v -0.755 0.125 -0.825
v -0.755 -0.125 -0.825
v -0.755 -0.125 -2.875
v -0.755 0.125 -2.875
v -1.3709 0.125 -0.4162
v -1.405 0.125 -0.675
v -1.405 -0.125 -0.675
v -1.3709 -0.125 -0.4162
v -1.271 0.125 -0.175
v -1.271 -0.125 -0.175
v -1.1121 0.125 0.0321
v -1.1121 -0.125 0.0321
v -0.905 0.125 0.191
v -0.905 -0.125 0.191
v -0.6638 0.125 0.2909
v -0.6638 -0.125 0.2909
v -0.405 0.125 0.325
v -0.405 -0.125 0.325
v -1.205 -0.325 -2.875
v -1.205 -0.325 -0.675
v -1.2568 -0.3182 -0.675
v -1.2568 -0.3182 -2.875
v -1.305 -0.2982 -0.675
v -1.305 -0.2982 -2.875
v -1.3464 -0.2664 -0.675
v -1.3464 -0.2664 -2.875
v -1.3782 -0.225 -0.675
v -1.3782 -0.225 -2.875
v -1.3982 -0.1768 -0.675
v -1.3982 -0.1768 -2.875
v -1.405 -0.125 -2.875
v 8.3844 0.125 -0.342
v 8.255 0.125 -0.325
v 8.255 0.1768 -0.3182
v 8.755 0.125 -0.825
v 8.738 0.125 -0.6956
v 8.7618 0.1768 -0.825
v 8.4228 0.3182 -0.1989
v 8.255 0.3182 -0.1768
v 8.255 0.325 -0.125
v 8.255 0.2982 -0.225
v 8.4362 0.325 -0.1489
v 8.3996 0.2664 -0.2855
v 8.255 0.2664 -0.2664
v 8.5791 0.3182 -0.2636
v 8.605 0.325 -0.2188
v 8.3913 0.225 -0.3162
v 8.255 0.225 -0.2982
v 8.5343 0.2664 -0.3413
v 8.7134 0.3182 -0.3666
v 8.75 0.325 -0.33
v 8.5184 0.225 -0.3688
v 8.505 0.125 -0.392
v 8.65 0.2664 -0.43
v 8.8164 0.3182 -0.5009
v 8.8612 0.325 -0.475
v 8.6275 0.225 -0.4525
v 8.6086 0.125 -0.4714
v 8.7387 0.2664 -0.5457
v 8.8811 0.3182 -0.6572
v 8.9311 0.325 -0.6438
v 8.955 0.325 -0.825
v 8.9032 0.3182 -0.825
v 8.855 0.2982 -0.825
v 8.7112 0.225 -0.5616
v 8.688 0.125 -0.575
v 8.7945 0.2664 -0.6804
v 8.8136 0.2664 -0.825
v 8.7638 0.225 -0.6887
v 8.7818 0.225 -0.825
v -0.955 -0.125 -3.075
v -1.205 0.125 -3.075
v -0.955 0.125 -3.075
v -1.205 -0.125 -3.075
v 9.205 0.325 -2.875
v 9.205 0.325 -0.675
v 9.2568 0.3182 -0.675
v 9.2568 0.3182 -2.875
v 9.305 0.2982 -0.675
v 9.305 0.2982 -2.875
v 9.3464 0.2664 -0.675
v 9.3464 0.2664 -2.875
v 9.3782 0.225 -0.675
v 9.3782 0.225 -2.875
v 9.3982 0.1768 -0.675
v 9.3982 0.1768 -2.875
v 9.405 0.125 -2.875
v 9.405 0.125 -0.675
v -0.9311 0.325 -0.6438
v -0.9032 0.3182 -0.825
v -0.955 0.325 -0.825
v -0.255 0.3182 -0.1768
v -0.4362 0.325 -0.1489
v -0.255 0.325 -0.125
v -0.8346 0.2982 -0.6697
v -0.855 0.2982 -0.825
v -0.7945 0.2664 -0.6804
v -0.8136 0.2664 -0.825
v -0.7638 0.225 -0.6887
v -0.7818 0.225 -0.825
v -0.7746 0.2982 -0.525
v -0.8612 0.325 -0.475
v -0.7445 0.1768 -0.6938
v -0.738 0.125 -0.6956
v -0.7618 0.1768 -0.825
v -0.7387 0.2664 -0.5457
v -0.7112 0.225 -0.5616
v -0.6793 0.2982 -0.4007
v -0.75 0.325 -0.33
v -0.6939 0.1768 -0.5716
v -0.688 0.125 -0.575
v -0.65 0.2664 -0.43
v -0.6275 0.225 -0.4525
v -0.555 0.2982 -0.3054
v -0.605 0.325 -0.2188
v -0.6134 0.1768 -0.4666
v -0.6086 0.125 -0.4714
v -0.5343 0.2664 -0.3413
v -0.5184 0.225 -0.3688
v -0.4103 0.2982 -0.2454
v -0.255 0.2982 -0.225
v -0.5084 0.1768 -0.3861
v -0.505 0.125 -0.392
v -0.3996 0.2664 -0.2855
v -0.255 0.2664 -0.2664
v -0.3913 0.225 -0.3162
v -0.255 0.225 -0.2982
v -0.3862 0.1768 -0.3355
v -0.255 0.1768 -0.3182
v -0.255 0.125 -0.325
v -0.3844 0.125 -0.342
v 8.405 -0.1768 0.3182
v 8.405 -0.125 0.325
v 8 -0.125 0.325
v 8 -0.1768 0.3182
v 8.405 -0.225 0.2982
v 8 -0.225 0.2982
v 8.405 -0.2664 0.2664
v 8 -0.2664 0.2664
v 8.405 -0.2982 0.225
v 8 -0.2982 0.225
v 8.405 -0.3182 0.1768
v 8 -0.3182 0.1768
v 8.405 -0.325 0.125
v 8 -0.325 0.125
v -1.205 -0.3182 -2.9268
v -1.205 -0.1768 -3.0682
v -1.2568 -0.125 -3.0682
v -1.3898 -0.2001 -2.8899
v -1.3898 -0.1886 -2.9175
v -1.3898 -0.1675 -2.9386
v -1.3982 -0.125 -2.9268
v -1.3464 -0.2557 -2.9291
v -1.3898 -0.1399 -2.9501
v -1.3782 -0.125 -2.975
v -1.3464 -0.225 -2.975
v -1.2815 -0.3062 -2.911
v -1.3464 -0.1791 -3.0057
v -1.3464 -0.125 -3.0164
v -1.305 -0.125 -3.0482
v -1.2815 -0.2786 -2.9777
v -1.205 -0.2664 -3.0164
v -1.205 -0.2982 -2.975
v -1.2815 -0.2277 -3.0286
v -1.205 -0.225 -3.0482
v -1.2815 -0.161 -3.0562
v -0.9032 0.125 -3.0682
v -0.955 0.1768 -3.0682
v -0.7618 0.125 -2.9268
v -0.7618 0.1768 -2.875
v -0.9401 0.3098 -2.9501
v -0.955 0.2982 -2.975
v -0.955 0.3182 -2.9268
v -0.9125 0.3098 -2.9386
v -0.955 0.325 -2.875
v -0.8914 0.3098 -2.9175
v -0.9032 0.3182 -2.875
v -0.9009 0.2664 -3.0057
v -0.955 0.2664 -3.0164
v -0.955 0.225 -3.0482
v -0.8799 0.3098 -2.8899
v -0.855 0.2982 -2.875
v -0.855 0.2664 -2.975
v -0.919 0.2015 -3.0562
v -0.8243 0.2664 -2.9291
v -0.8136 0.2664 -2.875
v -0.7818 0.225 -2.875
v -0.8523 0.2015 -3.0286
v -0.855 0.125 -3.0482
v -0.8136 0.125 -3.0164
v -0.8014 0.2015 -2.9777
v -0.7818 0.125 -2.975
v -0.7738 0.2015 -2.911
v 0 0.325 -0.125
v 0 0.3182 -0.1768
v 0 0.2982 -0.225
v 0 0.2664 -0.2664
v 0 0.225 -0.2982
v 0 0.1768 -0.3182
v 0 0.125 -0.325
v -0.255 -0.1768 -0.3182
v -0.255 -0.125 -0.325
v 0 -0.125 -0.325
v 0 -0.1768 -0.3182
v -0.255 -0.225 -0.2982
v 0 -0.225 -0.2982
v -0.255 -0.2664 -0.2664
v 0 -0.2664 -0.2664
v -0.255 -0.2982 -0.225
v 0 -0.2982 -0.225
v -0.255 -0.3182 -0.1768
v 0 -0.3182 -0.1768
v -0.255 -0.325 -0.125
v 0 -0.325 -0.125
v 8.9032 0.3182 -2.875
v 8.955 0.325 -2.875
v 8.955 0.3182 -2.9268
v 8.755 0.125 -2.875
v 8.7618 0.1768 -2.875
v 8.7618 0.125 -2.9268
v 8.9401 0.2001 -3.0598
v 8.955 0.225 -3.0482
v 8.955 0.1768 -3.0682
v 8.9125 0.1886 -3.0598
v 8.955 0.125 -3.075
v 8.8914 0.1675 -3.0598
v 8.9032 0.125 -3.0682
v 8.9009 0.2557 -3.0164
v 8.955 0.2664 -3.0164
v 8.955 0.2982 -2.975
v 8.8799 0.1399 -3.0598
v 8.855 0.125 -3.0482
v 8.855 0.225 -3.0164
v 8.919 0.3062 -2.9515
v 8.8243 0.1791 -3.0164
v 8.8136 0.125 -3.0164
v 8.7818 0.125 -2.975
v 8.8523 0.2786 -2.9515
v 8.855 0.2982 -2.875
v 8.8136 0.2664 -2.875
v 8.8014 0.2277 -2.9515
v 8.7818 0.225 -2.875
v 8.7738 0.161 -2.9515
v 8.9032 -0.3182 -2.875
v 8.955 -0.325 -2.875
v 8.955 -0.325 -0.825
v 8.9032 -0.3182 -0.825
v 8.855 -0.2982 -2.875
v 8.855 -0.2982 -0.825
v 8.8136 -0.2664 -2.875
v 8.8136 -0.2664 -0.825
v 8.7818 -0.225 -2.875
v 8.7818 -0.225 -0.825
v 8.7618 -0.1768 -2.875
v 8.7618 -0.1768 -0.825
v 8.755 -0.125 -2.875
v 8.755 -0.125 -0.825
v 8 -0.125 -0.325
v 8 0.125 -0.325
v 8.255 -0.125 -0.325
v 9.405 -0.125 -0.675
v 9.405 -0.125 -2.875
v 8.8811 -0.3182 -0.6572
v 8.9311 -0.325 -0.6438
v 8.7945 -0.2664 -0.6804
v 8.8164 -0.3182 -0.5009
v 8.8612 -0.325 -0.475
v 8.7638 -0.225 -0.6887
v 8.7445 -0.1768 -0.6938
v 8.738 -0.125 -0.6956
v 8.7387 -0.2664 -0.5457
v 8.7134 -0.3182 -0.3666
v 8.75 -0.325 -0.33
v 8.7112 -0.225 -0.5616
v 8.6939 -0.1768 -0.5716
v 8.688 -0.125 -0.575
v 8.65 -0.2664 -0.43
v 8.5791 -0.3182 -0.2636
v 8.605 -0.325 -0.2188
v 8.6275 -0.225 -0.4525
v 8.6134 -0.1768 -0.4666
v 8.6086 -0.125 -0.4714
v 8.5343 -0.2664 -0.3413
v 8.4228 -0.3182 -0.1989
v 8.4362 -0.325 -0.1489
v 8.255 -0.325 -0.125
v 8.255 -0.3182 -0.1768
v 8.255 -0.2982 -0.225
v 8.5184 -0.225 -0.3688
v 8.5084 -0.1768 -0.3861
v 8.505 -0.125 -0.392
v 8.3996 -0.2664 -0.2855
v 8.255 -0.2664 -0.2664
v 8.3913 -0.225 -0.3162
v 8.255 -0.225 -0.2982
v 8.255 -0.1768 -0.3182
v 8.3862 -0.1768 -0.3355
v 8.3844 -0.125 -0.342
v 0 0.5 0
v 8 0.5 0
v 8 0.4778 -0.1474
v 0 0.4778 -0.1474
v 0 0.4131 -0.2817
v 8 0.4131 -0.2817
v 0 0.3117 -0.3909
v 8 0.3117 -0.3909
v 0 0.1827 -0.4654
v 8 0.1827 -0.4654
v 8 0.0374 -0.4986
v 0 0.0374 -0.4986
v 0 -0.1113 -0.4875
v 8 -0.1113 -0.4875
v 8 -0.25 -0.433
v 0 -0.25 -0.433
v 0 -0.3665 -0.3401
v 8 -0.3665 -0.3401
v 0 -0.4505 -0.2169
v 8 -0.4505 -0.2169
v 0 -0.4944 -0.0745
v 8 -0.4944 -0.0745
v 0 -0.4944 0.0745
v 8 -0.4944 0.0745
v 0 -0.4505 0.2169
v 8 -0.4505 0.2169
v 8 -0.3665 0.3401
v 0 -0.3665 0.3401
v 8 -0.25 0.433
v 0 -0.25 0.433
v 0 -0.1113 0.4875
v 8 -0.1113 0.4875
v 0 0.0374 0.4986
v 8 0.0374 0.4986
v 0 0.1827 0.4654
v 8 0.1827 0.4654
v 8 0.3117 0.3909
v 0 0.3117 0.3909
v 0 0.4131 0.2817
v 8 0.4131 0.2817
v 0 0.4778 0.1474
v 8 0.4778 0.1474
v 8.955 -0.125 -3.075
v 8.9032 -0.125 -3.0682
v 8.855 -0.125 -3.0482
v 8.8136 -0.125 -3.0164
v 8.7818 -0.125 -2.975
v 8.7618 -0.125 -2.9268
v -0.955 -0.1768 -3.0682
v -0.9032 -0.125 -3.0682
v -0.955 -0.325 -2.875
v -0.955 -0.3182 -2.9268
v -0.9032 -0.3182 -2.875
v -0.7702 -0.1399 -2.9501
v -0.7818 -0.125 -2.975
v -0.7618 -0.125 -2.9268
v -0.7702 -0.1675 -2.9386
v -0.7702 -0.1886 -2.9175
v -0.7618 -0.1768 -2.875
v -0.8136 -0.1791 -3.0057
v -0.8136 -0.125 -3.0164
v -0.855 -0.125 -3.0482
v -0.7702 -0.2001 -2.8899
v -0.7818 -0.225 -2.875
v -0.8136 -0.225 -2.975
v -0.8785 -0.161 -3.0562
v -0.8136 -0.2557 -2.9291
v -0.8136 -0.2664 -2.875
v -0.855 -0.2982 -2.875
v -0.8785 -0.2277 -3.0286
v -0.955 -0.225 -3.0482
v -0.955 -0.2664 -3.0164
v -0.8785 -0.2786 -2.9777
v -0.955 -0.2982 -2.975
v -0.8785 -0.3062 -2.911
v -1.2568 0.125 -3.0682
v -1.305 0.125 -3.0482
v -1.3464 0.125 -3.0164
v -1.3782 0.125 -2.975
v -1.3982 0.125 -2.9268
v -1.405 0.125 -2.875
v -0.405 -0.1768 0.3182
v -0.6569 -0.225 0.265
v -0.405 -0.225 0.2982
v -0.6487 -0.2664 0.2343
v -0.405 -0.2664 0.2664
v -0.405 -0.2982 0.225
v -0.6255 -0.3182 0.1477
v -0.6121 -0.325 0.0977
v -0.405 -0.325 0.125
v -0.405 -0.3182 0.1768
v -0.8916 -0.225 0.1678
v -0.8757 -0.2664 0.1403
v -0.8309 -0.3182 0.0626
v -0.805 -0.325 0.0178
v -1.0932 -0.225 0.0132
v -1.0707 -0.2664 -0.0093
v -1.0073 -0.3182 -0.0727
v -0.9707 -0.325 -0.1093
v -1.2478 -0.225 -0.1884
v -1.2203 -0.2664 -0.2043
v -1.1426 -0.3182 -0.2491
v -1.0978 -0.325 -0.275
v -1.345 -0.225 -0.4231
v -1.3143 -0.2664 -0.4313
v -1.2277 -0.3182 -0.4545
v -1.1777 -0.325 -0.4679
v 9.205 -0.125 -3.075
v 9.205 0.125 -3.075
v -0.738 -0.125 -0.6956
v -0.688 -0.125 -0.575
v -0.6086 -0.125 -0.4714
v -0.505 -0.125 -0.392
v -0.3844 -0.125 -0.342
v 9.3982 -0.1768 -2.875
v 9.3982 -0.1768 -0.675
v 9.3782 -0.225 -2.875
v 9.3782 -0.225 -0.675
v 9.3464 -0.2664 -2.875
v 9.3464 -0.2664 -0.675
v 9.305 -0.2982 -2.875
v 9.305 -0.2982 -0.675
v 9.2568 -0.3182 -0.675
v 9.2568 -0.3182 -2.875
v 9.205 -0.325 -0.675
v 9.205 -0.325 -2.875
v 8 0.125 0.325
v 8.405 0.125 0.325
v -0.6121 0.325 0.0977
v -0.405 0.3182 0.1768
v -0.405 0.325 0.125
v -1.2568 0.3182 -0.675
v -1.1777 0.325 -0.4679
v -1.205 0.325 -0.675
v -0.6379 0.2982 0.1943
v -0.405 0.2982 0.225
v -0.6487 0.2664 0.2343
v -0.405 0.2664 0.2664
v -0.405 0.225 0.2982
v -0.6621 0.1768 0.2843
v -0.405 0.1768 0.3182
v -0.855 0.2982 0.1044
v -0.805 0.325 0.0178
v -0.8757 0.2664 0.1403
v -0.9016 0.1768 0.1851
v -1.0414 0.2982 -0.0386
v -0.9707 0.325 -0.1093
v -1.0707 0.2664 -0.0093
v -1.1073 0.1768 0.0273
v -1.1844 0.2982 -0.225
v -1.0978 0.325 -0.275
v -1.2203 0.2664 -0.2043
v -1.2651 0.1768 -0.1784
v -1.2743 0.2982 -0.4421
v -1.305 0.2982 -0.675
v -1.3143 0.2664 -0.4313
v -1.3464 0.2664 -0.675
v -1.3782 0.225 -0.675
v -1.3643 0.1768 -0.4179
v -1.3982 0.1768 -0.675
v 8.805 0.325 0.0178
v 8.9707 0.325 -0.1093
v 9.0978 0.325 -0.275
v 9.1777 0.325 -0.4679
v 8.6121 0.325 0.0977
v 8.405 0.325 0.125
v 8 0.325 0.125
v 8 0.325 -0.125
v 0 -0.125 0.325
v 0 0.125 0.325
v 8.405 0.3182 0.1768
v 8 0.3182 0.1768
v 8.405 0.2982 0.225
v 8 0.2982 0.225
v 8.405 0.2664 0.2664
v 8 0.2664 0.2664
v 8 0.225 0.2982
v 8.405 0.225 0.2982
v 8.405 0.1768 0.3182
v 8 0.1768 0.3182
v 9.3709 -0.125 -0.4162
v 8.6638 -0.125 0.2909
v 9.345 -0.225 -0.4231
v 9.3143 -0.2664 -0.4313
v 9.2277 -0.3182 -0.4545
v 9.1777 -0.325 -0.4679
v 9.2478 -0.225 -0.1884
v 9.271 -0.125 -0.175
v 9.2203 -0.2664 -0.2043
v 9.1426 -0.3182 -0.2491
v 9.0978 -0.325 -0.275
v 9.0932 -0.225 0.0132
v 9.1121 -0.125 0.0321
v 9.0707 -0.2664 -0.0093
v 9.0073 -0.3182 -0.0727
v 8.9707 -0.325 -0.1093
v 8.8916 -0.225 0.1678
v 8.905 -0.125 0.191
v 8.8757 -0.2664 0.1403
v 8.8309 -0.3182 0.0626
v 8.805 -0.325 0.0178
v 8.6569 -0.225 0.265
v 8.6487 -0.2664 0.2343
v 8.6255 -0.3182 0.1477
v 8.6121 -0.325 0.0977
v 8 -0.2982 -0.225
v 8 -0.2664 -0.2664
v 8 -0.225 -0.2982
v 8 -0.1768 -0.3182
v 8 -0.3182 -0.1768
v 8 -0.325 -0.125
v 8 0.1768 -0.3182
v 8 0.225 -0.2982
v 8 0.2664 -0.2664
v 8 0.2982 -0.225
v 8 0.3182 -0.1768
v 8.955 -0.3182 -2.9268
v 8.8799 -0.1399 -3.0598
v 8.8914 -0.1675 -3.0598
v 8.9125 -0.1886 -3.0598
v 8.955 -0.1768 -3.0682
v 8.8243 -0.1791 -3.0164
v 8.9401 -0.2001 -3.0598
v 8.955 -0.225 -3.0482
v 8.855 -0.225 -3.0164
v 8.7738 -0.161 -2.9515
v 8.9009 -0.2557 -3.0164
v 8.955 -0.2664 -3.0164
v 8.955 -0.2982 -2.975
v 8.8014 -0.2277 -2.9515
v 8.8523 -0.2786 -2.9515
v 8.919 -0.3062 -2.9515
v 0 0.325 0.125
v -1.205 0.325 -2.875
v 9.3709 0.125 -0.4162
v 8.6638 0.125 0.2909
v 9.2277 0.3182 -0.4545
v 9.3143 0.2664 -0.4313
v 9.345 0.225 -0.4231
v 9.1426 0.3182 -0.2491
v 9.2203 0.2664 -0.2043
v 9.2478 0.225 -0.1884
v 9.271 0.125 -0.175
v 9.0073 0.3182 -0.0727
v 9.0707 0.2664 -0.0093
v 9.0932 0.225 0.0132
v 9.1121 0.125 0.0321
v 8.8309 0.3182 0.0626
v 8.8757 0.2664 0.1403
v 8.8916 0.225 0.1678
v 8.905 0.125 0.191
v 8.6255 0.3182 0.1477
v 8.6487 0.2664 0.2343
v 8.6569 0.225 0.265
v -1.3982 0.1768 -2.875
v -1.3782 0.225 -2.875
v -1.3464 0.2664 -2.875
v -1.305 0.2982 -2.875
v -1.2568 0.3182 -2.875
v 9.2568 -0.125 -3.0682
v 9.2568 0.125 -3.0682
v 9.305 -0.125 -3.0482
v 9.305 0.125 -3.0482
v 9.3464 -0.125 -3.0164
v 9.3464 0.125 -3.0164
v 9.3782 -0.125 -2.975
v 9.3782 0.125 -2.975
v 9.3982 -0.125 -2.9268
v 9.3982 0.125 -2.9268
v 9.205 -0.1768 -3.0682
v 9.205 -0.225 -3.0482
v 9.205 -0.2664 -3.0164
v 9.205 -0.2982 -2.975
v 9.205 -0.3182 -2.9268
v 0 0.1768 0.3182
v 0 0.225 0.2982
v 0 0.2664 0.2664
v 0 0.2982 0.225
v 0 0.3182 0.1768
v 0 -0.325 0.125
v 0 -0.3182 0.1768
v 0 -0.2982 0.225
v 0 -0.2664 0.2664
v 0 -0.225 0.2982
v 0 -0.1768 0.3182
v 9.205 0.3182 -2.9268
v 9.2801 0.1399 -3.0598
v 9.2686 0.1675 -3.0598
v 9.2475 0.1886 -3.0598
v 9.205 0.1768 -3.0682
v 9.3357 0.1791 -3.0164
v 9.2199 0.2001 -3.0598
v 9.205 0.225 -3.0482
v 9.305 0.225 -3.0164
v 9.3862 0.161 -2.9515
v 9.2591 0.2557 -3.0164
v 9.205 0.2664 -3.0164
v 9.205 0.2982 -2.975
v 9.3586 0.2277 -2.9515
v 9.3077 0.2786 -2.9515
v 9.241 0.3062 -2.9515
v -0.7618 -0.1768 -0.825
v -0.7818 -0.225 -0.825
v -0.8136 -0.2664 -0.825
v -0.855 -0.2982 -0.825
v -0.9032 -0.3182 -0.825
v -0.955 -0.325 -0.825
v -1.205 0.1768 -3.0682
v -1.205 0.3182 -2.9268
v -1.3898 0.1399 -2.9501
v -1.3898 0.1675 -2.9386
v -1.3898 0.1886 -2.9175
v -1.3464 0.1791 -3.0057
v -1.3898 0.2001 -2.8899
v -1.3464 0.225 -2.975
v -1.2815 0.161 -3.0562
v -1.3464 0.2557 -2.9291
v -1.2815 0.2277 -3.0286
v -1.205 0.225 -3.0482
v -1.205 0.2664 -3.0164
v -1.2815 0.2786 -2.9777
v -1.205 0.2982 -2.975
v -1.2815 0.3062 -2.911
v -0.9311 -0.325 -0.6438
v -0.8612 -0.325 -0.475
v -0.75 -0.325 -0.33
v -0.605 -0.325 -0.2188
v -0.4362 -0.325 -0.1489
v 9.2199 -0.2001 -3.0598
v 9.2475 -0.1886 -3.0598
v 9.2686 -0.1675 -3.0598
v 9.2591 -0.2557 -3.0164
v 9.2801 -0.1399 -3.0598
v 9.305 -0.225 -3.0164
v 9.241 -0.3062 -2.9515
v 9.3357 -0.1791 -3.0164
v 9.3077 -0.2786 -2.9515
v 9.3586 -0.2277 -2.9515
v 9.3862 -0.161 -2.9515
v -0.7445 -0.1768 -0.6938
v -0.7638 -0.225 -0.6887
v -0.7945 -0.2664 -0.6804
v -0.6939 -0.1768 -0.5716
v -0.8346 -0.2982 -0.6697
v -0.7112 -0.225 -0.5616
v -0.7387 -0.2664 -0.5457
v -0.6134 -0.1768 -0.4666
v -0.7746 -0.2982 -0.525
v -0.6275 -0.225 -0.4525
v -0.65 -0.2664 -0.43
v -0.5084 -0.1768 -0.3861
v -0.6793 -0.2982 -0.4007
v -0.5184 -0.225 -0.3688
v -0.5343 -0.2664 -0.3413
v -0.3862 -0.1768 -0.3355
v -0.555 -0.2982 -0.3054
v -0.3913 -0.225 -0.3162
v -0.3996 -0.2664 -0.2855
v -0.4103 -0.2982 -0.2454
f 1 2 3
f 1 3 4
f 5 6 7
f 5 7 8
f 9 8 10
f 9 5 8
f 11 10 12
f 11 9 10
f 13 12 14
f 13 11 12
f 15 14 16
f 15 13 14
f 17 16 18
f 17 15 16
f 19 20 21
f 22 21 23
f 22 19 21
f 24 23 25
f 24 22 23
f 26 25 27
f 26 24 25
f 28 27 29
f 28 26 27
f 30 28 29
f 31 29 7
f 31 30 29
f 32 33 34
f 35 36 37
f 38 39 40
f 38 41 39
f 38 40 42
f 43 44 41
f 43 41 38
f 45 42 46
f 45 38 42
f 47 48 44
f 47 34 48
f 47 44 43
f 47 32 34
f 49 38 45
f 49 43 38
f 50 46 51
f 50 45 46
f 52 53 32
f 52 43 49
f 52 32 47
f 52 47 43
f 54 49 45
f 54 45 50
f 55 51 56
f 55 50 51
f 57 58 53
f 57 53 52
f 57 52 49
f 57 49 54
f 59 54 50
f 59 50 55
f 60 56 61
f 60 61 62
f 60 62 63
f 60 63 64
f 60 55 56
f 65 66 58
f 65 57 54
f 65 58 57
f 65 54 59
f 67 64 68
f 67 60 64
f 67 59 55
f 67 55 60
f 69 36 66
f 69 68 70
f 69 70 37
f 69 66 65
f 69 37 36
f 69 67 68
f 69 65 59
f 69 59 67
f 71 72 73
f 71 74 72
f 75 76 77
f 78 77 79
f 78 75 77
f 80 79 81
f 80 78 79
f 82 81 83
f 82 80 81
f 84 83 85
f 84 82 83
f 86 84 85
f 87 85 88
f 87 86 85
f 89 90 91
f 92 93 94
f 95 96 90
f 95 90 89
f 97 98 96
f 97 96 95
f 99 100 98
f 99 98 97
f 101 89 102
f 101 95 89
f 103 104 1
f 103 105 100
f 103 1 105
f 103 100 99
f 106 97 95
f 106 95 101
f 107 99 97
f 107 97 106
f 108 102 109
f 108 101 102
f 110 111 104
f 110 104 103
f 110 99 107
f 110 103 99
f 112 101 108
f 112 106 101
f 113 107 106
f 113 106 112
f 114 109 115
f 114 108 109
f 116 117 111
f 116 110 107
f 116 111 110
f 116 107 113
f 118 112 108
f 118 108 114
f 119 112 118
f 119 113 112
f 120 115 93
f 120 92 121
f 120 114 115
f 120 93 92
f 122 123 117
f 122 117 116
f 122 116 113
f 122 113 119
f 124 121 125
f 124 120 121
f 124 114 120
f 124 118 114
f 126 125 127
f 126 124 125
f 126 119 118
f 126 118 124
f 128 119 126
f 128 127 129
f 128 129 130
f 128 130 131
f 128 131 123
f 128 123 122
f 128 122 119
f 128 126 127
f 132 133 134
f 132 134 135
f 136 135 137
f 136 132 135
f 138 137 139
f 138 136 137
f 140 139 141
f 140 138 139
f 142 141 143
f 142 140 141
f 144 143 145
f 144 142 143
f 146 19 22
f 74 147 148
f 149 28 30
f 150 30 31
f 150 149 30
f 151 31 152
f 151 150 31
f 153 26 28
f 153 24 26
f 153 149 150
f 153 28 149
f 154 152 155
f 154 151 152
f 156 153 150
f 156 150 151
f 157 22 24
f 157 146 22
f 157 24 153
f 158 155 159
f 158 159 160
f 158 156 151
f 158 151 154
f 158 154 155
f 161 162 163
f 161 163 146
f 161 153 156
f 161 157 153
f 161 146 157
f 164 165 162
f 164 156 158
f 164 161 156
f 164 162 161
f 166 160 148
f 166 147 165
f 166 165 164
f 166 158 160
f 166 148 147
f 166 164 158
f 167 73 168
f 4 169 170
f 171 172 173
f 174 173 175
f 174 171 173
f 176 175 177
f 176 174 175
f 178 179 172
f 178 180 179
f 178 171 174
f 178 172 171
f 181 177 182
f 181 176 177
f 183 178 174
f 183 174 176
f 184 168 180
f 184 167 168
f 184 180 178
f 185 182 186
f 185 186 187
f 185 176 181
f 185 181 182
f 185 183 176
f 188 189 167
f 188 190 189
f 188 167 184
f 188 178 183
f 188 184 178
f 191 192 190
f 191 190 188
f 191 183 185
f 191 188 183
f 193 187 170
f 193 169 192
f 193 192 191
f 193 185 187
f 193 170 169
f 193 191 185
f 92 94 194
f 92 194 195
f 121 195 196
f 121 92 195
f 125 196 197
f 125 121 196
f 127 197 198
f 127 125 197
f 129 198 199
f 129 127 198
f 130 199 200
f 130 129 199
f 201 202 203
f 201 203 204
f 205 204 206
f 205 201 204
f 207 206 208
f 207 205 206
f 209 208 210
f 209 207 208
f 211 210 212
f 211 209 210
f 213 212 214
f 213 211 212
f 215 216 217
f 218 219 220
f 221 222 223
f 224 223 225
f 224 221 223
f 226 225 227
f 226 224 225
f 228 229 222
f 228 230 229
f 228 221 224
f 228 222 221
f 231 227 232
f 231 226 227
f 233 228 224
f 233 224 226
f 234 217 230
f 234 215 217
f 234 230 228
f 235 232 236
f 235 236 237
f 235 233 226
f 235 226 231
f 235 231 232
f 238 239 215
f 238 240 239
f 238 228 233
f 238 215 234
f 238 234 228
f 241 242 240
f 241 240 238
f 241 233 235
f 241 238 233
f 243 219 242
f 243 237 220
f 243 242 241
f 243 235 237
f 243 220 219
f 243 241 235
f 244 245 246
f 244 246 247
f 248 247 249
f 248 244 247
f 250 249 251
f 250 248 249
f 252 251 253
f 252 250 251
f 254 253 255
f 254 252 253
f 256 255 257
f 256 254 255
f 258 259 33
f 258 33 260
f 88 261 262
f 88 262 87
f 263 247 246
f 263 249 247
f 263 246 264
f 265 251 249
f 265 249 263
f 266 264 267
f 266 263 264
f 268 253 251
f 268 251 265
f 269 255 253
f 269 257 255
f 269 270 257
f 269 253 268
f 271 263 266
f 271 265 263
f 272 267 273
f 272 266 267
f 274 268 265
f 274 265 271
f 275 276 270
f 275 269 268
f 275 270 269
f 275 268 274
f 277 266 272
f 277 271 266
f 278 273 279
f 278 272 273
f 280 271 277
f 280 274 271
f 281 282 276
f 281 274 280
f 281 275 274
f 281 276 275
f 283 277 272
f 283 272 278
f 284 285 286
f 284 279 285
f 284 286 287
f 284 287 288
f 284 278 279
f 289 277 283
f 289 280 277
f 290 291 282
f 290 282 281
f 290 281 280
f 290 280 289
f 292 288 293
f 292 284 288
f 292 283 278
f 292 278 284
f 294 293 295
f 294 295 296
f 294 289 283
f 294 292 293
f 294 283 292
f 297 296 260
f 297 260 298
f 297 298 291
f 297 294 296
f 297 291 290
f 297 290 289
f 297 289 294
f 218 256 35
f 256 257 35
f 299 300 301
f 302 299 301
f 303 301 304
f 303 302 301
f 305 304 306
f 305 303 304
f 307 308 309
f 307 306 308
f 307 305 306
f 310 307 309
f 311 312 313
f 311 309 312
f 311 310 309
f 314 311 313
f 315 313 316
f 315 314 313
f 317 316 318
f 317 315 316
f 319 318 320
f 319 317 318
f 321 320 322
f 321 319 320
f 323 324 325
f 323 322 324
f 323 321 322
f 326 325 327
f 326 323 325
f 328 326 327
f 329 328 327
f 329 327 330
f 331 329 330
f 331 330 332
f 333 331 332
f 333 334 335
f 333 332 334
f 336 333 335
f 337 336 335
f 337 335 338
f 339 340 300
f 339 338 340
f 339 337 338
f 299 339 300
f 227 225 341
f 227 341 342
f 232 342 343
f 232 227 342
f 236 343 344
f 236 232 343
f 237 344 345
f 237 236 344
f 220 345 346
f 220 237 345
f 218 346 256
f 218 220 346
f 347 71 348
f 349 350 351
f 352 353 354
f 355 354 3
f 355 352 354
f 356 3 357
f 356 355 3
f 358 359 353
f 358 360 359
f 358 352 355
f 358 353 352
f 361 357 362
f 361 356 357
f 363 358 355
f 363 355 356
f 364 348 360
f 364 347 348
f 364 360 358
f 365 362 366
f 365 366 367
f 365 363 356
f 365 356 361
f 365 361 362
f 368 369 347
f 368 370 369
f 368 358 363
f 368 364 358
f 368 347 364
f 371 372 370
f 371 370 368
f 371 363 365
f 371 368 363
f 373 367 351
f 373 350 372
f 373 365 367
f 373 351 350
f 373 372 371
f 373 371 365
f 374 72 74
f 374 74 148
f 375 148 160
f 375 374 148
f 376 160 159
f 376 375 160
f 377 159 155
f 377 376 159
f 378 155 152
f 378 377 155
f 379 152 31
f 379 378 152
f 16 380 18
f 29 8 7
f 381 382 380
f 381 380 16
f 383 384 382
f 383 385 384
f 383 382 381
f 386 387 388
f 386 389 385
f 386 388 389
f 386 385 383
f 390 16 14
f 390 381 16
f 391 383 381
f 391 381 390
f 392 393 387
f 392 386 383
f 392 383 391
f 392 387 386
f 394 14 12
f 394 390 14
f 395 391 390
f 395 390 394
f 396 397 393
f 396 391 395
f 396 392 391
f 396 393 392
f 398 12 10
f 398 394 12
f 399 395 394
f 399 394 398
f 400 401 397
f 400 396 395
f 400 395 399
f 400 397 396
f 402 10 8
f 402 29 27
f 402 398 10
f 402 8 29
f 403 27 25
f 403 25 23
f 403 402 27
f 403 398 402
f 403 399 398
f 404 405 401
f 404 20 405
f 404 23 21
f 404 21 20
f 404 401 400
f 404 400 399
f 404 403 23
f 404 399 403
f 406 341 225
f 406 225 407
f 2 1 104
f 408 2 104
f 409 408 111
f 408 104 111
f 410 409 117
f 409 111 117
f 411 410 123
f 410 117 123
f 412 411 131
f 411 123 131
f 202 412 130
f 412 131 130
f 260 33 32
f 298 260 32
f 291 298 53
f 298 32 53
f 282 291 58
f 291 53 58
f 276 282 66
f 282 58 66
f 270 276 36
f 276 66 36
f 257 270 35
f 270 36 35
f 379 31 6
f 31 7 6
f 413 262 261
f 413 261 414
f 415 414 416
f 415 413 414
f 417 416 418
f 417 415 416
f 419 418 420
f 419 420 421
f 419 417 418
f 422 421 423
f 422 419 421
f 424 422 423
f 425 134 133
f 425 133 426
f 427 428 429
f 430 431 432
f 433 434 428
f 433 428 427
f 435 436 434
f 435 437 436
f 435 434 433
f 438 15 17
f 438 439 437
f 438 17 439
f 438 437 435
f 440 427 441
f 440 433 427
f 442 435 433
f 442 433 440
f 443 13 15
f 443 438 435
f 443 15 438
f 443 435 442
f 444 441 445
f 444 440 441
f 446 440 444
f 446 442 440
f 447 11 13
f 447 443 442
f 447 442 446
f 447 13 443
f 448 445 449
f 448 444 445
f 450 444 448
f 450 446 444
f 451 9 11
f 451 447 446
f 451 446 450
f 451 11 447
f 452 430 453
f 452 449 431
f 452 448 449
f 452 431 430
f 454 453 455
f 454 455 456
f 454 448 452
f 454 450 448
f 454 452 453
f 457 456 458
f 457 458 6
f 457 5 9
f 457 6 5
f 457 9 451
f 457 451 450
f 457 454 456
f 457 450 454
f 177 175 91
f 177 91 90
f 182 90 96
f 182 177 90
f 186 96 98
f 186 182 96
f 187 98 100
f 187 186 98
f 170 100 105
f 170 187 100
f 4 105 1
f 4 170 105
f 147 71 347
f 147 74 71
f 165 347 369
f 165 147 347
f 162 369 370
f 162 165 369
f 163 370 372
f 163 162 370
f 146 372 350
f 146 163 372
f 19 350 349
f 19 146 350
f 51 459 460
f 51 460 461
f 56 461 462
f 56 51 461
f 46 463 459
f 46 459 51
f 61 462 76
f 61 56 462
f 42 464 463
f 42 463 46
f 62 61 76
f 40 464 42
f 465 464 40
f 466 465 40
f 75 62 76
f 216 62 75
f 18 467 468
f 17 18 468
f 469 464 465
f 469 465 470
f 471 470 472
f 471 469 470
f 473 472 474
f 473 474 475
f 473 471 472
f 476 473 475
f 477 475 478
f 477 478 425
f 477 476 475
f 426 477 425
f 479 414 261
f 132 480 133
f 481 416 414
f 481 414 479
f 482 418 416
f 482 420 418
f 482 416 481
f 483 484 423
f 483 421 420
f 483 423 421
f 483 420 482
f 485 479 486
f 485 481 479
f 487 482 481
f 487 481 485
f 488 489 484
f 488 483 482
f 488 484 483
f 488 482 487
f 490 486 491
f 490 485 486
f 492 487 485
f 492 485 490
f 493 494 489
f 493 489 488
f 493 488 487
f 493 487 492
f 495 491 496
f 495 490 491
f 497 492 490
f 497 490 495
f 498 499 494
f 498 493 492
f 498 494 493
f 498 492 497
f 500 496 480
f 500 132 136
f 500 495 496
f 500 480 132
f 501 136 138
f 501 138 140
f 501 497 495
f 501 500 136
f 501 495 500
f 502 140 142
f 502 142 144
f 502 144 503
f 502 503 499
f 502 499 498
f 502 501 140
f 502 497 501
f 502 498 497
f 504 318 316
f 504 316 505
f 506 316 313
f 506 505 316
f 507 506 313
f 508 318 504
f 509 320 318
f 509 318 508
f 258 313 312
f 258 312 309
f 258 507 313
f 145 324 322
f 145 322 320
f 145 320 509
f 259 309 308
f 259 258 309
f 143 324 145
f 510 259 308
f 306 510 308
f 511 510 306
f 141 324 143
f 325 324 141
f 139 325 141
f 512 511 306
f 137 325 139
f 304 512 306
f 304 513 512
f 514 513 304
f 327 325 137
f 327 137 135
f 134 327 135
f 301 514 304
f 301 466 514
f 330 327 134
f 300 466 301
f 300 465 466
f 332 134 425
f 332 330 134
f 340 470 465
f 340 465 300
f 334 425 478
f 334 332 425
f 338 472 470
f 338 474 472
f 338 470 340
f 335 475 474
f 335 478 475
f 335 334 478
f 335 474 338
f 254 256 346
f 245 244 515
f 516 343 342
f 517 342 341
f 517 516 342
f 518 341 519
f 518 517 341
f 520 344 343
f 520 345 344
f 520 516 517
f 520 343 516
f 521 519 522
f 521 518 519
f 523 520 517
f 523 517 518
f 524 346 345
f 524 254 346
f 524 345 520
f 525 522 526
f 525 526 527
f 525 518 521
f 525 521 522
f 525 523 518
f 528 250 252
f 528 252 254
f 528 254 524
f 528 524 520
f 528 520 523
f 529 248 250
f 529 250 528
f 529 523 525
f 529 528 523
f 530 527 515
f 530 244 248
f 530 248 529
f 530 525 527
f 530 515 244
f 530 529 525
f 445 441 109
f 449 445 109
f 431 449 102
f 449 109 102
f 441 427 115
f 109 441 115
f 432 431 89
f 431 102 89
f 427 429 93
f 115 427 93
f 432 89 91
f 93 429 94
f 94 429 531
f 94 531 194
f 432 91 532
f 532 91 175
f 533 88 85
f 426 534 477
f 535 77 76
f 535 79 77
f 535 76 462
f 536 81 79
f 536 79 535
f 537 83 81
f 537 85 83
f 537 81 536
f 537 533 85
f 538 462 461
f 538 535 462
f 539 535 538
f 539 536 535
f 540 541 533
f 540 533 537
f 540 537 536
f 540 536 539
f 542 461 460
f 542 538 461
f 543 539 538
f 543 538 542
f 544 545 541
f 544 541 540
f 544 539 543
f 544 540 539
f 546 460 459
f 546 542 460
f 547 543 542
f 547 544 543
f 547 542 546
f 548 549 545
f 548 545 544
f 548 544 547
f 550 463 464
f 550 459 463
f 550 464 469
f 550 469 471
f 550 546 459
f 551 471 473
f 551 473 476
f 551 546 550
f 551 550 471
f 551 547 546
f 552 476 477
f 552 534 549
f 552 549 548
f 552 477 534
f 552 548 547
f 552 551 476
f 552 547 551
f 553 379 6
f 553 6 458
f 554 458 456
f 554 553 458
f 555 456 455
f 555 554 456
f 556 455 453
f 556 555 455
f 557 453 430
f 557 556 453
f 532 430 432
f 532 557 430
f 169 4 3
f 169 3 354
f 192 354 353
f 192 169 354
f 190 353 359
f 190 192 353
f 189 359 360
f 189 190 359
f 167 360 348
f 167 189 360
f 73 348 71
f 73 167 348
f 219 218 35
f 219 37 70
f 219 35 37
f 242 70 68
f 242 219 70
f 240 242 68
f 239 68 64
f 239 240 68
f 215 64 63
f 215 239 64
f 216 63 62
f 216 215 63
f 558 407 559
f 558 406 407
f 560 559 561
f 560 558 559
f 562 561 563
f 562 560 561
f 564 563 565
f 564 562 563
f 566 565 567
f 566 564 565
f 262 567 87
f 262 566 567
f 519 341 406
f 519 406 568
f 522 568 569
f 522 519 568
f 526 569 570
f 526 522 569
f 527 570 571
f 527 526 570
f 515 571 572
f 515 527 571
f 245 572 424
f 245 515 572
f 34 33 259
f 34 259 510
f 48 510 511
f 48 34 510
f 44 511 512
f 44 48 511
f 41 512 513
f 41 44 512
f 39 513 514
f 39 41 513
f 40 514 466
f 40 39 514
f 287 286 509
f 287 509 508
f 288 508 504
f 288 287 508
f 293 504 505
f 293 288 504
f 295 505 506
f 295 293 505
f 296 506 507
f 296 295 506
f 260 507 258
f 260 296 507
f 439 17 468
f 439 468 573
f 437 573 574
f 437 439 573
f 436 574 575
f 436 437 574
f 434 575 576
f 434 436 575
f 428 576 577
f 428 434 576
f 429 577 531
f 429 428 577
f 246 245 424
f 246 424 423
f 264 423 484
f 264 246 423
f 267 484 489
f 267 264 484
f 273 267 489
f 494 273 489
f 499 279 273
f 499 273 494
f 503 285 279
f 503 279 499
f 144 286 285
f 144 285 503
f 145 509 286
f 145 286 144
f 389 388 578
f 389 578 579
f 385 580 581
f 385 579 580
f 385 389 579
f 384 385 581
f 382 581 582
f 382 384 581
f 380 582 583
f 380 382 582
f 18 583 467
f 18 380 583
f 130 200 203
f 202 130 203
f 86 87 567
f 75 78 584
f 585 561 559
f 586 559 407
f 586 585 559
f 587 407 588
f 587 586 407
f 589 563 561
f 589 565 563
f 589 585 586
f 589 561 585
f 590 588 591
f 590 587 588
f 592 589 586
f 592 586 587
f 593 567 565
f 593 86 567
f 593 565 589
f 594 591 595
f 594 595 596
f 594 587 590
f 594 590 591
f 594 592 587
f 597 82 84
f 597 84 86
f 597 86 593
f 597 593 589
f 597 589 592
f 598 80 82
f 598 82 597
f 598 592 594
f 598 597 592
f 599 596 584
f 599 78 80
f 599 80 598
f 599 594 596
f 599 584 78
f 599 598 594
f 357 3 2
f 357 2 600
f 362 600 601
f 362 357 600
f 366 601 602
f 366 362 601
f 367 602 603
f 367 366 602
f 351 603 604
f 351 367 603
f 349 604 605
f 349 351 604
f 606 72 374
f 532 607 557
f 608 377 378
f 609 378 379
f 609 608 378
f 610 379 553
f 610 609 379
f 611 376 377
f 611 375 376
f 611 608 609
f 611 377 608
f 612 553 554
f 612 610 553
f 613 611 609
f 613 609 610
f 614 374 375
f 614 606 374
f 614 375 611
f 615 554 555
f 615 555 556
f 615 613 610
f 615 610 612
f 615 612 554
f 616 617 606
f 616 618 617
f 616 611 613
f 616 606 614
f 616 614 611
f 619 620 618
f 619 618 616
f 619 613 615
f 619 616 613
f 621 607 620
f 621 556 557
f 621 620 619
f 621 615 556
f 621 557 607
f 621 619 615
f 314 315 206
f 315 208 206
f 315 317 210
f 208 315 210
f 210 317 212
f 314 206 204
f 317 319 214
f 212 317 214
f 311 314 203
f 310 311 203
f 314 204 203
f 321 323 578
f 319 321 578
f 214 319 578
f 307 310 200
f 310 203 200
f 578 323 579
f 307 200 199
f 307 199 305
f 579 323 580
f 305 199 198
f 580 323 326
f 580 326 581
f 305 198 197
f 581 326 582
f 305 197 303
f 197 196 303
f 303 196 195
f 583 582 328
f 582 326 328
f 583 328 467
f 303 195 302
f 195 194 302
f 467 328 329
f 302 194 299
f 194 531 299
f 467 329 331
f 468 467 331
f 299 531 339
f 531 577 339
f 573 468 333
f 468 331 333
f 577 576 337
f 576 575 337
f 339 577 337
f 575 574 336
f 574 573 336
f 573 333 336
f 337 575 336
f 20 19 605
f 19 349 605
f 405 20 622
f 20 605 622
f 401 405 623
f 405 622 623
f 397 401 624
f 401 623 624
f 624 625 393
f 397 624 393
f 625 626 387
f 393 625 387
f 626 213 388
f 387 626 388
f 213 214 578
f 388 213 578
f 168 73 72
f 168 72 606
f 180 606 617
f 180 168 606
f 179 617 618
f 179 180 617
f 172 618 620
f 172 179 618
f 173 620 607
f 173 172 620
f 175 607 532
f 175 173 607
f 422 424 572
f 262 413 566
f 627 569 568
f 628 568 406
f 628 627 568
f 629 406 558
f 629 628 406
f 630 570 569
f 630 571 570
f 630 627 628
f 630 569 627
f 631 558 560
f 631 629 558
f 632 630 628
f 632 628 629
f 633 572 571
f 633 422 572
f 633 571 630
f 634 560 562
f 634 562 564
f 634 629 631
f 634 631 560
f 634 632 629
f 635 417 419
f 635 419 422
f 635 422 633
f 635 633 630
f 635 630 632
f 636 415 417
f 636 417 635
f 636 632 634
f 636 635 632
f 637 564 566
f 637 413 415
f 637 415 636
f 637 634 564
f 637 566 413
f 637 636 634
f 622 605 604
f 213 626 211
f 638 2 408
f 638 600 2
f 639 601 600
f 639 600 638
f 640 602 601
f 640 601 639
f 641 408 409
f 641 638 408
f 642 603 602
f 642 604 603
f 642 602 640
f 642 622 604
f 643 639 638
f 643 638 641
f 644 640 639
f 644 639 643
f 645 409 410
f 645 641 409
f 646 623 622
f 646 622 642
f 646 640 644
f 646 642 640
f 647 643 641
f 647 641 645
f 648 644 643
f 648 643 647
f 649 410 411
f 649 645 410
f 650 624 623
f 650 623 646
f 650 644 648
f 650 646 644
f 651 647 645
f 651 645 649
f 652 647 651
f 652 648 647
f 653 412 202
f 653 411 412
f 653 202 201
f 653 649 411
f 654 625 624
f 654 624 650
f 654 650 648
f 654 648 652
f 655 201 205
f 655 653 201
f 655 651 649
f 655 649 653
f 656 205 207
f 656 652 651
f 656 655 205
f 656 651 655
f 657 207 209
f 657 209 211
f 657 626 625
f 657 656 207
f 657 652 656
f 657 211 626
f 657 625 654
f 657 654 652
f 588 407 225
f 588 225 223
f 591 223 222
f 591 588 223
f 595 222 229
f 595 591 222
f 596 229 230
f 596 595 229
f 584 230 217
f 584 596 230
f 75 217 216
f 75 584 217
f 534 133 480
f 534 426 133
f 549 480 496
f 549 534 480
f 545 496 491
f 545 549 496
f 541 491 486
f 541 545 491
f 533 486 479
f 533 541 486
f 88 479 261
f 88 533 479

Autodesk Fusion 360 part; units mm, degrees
sketch "Sketch1" plane through (0, 0, 0) normal (1, 0, 0) x (0, 1, 0)
  circle A0 centre (0, 0) radius 0.5
  line L0 (0.325, -0.325) -> (-0.325, -0.325)
  line L1 (-0.325, -0.325) -> (-0.325, 0.325)
  line L2 (-0.325, 0.325) -> (0.325, 0.325)
  line L3 (0.325, 0.325) -> (0.325, -0.325)
  line L4 (0.325, -0.325) -> (-0.325, 0.325) construction
  line L5 (-0.325, -0.325) -> (0.325, 0.325) construction
  dimension "d1" = 1
  dimension "d2" = 0.65
  dimension "d3" = 0.65
extrude "Extrude1" add sketch "Sketch1" along normal blind 8 contours A0 | L0 L1 L2 L3
sketch "Sketch2" plane through (8, 0, 0) normal (1, 0, 0) x (0, 1, 0)
  circle A0 centre (0, 0) radius 0.5
  line L0 (0.325, -0.325) -> (-0.325, -0.325)
  line L1 (-0.325, -0.325) -> (-0.325, 0.325)
  line L2 (-0.325, 0.325) -> (0.325, 0.325)
  line L3 (0.325, 0.325) -> (0.325, -0.325)
  line L4 (0.325, -0.325) -> (-0.325, 0.325) construction
  line L5 (-0.325, -0.325) -> (0.325, 0.325) construction
  dimension "d8" = 0.65
  dimension "d9" = 0.65
extrude "Extrude2" add sketch "Sketch2" along normal blind 1.405 contours L0 L1 L2 L3
extrude "Extrude3" add sketch "Sketch1" against normal blind 1.405 contours L0 L1 L2 L3
sketch "Sketch3" plane through (0, 0, -0.325) normal (0, 0, -1) x (1, 0, 0)
  line L0 (8, 0.325) -> (8, -0.325)
  line L1 (8, -0.325) -> (9.405, -0.325)
  line L2 (9.405, -0.325) -> (9.405, 0.325)
  line L3 (9.405, 0.325) -> (8, 0.325)
  line L4 (9.405, 0.325) -> (8.755, 0.325)
  line L5 (8.755, 0.325) -> (8.755, -0.325)
  line L6 (8.755, -0.325) -> (9.405, -0.325)
  line L7 (9.405, -0.325) -> (9.405, 0.325)
  line L8 (9.405, 0.325) -> (8.755, -0.325) construction
  line L9 (8.755, 0.325) -> (9.405, -0.325) construction
  point P0 (9.08, 0)
  dimension "d14" = 0.65
  dimension "d15" = 0.65
sketch "Sketch4" plane through (0, 0, -0.325) normal (0, 0, -1) x (1, 0, 0)
  line L0 (0, -0.325) -> (0, 0.325)
  line L1 (0, 0.325) -> (-1.405, 0.325)
  line L2 (-1.405, 0.325) -> (-1.405, -0.325)
  line L3 (-1.405, -0.325) -> (0, -0.325)
  line L4 (-0.755, -0.325) -> (-1.405, -0.325)
  line L5 (-1.405, -0.325) -> (-1.405, 0.325)
  line L6 (-1.405, 0.325) -> (-0.755, 0.325)
  line L7 (-0.755, 0.325) -> (-0.755, -0.325)
  line L8 (-0.755, -0.325) -> (-1.405, 0.325) construction
  line L9 (-1.405, -0.325) -> (-0.755, 0.325) construction
  point P0 (-1.08, 0)
  dimension "d17" = 0.65
  dimension "d18" = 0.65
extrude "Extrude4" add sketch "Sketch4" sketch "Sketch3" along normal blind 2.75 contours L1 L2 L3 L4 L5 L6 L7 of sketch 2 contours L1 L2 L3 L4 L5 L6 L7
fillet "Fillet1" radius 0.5 2 edges at (-0.755, 0, -0.325) (8.755, 0, -0.325)
fillet "Fillet2" radius 1 2 edges at (-1.405, 0, 0.325) (9.405, 0, 0.325)
fillet "Fillet3" radius 0.2 28 edges at (-1.08, -0.325, -3.075) (-0.755, 0, -3.075) (-1.08, 0.325, -3.075) (-1.405, 0, -3.075) (-0.6086, -0.325, -0.4714) (-0.755, -0.325, -1.95) (-0.2025, -0.325, 0.325) (-1.1121, -0.325, 0.0321) (-1.405, -0.325, -1.875) (-0.2025, 0.325, 0.325) (-1.1121, 0.325, 0.0321) (-1.405, 0.325, -1.875) (-0.6086, 0.325, -0.4714) (-0.755, 0.325, -1.95) (8.2025, -0.325, 0.325) (9.1121, -0.325, 0.0321) (9.405, -0.325, -1.875) (8.755, -0.325, -1.95) (8.6086, -0.325, -0.4714) (9.405, 0.325, -1.875) (9.1121, 0.325, 0.0321) (8.2025, 0.325, 0.325) (8.6086, 0.325, -0.4714) (8.755, 0.325, -1.95) (9.08, 0.325, -3.075) (9.405, 0, -3.075) (9.08, -0.325, -3.075) (8.755, 0, -3.075)
equation "d1 = width"
equation "d2 = d3"
equation "d3 = d1 * 0.65"
equation "width = 1 mm"
equation "baseLenght = 8 mm"
equation "d6 = baseLenght"
equation "d8 = width * 0.65"
equation "d9 = d8"
equation "d10 = ( ( 2.54 * ceil(( baseLenght + 1.3 * width ) / 2.54 mm) ) * 1 mm + 0.65 * width - baseLenght ) / 2"
equation "d12 = -( ( 2.54 * ceil(( baseLenght + 1.3 * width ) / 2.54 mm) ) * 1 mm + 0.65 * width - baseLenght ) / 2"
equation "d14 = width * 0.65"
equation "d15 = d14"
equation "d17 = width * 0.65"
equation "d18 = d17"
equation "d26 = 0.2 * width"
